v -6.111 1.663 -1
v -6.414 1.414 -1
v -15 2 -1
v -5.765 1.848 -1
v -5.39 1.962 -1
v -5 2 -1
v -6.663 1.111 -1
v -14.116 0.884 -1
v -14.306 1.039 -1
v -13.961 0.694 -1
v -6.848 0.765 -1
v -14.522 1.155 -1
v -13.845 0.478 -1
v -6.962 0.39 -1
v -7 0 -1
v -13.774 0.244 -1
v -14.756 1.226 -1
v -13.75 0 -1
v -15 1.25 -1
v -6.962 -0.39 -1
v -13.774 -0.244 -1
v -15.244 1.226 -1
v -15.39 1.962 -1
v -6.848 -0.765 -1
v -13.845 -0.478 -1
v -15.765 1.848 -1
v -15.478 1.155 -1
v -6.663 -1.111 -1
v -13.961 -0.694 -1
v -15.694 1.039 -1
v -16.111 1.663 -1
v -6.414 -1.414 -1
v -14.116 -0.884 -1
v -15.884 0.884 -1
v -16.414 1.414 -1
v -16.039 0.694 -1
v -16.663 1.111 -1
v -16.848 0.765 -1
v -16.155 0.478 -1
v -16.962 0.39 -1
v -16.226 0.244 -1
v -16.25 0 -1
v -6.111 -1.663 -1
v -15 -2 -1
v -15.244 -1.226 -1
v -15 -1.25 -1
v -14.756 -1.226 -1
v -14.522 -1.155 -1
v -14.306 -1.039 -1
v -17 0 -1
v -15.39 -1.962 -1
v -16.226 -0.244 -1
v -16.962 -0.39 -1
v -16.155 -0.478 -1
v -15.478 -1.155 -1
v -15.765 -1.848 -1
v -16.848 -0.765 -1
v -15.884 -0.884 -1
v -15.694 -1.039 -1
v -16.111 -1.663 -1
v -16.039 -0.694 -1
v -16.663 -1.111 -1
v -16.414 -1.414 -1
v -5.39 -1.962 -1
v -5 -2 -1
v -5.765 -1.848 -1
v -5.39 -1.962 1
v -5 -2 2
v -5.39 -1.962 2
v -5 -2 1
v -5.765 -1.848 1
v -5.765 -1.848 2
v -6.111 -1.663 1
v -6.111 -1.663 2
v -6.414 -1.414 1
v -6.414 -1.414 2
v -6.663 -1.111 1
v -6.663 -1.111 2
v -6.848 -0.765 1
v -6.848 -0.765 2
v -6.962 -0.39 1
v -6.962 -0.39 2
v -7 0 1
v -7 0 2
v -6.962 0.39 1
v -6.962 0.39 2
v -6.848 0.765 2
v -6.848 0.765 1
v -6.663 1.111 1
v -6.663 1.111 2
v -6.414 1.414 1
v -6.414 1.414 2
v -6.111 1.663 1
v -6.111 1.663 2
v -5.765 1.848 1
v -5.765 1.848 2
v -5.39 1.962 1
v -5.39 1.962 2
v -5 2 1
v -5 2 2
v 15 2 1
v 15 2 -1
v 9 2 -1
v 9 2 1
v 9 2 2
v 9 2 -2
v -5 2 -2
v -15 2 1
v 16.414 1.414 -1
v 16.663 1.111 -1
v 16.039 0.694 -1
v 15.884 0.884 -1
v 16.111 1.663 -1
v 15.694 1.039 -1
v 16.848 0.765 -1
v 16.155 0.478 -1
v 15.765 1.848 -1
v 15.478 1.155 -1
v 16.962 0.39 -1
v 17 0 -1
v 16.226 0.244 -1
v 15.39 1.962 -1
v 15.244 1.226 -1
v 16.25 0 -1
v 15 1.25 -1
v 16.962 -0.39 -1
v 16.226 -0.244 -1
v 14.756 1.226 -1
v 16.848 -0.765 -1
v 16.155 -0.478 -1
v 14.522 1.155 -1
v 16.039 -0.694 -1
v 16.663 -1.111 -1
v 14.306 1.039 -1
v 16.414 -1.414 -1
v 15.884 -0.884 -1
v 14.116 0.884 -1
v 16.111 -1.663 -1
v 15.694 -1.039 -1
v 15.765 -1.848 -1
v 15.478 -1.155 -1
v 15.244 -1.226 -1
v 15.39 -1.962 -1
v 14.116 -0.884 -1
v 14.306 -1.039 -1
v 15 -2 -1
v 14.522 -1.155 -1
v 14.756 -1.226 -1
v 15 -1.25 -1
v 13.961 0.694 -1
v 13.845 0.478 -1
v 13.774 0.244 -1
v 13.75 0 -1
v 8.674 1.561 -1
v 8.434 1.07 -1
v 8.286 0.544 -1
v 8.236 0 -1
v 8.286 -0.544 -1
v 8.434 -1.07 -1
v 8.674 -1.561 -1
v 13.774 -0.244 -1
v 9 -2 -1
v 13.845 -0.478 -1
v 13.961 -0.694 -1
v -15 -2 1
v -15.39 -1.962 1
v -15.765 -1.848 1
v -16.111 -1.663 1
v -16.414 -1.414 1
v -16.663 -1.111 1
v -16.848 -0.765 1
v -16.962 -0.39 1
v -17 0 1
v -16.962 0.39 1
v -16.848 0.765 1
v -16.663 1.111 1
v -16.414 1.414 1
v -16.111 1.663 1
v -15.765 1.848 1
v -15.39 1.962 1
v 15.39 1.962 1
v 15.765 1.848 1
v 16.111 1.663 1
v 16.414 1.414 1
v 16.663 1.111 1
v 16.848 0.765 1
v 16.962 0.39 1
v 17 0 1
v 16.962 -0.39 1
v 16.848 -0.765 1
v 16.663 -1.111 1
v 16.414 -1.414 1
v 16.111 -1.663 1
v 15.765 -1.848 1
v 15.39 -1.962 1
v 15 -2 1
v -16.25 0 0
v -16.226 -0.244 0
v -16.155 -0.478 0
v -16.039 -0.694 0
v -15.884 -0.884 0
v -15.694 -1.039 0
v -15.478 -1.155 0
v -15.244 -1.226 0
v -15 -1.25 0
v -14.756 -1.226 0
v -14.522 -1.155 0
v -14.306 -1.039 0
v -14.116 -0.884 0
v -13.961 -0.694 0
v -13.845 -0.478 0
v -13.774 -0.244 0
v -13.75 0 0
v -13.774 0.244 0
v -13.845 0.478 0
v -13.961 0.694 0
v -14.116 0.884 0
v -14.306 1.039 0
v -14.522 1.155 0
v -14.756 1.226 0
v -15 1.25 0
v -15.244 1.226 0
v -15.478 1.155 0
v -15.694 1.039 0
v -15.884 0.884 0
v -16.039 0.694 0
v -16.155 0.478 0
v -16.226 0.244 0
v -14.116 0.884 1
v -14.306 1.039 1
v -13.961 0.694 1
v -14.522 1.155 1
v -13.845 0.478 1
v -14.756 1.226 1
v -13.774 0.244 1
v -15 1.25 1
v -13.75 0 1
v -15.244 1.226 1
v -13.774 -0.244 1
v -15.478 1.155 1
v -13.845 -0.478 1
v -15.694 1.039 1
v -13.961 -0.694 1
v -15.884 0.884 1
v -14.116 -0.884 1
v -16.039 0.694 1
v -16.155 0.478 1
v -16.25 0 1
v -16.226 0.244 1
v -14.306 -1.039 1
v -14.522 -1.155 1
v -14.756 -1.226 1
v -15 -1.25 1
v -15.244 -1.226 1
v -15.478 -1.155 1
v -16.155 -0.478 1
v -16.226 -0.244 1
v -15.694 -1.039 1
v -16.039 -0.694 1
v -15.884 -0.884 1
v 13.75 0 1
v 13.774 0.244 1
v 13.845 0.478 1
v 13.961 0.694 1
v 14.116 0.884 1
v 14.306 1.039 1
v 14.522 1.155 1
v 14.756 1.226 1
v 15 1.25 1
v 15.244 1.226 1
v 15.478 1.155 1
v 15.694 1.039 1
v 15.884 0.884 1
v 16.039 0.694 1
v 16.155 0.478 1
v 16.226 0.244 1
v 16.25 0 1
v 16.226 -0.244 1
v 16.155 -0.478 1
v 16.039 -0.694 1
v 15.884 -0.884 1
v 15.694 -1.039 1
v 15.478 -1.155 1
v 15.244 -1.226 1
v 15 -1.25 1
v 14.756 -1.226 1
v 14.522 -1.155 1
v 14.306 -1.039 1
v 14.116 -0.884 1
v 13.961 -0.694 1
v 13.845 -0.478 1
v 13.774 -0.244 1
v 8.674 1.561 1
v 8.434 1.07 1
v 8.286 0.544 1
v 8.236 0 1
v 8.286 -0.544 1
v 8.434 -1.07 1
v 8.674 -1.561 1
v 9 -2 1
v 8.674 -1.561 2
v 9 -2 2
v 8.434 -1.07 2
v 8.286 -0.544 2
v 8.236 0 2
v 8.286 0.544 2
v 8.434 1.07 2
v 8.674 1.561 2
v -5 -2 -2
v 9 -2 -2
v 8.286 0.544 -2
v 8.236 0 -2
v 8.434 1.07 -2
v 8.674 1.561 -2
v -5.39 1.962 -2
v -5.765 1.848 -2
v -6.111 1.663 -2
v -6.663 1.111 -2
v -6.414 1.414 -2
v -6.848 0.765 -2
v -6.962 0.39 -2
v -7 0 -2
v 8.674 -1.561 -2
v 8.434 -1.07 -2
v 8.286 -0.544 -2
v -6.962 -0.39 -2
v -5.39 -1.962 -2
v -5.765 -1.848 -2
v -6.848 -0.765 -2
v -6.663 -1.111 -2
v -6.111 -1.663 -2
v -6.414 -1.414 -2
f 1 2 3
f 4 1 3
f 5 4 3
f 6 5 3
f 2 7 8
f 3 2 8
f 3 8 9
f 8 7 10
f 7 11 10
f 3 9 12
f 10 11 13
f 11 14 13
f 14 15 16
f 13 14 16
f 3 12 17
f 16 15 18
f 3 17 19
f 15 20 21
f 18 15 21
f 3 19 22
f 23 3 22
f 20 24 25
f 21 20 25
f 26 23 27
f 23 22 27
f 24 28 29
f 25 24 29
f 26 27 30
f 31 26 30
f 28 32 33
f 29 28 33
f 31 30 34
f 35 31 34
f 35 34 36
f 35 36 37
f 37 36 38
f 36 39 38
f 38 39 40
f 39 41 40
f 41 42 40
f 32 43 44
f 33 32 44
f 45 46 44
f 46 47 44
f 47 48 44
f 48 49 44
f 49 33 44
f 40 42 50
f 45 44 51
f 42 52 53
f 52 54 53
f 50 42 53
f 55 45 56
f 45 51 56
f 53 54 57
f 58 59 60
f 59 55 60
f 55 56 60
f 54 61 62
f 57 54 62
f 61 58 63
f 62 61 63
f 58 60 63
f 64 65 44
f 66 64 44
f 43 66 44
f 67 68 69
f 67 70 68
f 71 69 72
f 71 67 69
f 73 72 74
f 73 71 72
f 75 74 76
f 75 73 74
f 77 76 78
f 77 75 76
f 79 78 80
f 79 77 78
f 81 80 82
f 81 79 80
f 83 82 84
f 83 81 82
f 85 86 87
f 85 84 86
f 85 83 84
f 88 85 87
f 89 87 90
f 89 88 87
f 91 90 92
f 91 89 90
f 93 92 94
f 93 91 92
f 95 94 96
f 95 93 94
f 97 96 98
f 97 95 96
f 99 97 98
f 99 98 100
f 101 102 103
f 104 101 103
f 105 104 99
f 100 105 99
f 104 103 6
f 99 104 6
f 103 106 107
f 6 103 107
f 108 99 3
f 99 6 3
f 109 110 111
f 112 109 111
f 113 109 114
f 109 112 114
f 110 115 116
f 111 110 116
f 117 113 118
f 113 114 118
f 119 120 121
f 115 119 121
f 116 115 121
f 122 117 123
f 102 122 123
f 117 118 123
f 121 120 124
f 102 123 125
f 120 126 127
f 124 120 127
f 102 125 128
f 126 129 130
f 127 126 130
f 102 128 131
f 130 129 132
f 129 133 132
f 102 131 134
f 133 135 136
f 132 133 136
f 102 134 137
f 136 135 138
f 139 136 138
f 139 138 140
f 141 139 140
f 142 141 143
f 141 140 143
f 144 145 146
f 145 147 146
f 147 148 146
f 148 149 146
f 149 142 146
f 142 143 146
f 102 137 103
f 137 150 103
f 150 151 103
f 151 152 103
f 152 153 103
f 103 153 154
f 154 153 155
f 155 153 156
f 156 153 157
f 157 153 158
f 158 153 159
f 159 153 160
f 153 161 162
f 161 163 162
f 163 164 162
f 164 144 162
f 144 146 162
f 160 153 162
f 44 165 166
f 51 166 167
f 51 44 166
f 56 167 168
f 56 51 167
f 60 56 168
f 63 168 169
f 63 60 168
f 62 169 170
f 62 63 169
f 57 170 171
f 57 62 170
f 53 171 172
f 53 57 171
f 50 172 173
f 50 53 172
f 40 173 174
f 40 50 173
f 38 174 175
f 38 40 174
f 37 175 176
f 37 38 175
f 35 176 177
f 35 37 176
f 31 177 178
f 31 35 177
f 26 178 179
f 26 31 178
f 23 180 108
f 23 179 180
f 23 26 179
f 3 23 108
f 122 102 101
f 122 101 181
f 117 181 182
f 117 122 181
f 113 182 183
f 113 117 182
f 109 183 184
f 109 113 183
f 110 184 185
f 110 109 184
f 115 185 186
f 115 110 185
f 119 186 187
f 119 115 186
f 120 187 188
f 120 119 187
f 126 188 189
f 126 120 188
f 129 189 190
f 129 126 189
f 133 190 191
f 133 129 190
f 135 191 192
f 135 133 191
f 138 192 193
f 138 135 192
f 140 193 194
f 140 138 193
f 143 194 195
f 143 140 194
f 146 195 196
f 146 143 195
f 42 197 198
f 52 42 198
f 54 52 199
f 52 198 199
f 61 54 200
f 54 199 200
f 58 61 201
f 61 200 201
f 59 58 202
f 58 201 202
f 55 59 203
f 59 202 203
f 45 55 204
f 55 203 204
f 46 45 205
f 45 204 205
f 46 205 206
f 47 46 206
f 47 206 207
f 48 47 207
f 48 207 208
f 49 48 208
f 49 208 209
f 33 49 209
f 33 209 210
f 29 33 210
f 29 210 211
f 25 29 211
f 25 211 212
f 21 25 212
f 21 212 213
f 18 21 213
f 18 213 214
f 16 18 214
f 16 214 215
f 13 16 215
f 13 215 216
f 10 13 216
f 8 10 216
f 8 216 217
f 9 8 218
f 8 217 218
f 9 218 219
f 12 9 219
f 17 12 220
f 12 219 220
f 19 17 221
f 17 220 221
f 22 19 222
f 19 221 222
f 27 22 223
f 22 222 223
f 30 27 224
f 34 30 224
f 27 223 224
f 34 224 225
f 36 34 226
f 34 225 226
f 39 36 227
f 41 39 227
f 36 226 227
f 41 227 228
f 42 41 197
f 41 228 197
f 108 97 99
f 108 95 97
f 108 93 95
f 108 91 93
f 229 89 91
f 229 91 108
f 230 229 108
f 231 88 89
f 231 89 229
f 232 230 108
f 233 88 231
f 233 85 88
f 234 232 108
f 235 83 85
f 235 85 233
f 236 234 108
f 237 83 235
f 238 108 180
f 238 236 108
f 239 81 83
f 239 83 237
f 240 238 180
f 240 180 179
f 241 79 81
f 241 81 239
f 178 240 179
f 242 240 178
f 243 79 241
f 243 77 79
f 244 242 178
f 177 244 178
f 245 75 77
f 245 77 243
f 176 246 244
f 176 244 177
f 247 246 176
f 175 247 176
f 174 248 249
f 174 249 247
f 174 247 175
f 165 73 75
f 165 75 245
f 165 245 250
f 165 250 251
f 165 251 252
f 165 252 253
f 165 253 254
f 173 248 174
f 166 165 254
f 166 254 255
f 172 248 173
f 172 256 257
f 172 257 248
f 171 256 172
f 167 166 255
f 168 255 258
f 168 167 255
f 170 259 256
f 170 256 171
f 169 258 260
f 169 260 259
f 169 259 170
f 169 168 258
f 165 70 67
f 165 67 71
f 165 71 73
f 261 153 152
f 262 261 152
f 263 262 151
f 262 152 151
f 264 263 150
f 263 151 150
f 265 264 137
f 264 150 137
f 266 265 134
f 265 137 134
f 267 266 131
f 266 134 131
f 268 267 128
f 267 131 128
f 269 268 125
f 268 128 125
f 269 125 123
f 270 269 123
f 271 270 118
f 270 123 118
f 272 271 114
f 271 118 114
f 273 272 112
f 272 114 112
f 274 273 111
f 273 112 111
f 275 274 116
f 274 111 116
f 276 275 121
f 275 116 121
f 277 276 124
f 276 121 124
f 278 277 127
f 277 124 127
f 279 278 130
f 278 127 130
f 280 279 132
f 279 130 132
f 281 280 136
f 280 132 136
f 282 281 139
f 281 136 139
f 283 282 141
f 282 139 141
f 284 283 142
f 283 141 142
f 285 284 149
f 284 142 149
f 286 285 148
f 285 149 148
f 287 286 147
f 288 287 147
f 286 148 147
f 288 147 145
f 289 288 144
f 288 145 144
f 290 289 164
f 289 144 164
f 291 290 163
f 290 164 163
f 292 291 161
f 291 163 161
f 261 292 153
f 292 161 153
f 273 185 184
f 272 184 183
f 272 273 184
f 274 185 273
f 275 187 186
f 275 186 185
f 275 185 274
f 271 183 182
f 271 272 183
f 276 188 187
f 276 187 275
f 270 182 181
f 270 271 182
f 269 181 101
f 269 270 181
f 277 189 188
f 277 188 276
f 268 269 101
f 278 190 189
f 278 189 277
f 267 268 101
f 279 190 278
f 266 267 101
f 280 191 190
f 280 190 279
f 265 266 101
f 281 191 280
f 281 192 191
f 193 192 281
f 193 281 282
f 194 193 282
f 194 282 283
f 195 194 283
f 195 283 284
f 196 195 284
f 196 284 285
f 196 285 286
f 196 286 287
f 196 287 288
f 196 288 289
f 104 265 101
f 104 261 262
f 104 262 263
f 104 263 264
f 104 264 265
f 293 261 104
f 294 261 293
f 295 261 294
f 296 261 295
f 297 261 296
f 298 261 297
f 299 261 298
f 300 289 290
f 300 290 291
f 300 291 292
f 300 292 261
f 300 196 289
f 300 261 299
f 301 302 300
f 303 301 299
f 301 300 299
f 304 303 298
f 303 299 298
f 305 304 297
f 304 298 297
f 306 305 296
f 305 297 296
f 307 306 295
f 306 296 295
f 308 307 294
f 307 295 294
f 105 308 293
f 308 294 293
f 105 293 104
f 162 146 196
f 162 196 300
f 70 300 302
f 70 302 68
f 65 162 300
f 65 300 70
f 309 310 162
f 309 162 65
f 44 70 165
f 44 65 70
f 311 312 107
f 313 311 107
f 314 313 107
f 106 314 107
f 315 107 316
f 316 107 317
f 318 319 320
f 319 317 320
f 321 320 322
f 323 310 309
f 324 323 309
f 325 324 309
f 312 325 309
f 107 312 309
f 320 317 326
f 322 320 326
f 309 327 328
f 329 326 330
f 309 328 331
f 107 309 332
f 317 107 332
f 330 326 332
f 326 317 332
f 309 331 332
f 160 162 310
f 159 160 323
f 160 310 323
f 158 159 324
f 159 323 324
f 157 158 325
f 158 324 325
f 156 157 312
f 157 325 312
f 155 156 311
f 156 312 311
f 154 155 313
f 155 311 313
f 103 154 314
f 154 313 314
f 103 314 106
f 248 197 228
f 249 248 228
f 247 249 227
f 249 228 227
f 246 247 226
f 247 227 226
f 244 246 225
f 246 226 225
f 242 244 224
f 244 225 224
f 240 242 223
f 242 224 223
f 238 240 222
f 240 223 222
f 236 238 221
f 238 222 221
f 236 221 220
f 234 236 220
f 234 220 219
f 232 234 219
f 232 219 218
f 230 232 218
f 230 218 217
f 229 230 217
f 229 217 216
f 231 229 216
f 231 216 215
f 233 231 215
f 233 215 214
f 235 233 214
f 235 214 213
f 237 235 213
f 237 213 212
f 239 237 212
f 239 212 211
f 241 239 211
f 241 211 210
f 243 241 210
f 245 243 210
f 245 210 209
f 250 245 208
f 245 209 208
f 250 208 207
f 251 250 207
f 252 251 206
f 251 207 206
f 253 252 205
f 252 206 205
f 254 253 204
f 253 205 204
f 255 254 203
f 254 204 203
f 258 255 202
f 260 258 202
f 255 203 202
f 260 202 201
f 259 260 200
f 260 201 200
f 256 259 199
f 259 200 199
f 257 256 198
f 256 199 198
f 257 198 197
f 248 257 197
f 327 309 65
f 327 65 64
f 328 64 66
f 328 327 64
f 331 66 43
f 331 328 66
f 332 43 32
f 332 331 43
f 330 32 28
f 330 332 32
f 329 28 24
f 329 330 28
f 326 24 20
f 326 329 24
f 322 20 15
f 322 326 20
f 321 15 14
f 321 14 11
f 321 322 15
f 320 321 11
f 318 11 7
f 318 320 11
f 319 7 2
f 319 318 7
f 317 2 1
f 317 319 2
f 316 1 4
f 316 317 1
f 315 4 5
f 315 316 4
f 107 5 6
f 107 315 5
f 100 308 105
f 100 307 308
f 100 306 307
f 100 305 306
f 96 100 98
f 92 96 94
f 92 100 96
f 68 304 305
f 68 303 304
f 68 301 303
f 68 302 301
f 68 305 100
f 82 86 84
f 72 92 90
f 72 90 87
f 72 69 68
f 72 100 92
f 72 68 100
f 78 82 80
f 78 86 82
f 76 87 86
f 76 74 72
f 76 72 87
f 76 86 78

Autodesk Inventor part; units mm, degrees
ref_plane "YZ Plane" through (0, 0, 0) normal (1, 0, 0) x (0, 1, 0)
ref_plane "XZ Plane" through (0, 0, 0) normal (0, 1, 0) x (-1, 0, 0)
ref_plane "XY Plane" through (0, 0, 0) normal (0, 0, 1) x (1, 0, 0)
sketch "Sketch1" plane through (0, 0, 0) normal (0, 0, 1) x (1, 0, 0)
  line L0 (0, 0) -> (15, 0)
  line L1 (0, 0) -> (-15, 0)
  line L2 (0, 0) -> (5, 0)
  circle A0 centre (-15, 0) radius 1.25
  circle A1 centre (15, 0) radius 1.25
  circle A2 centre (-15, 0) radius 2
  circle A3 centre (15, 0) radius 2
  line L3 (-15, 2) -> (15, 2)
  line L4 (-15, -2) -> (15, -2)
  line L5 (-15, 2) -> (-9, 2)
  line L6 (-9, 2) -> (-9, -2)
  line L7 (-9, -2) -> (-15, -2)
  line L8 (-15, -2) -> (-15, 2)
  line L9 (15, 2) -> (12.5, 2)
  line L10 (15, -2) -> (15, 2)
  arc A4 (-9, -2) -> (-9, 2) centre (-11.2361, 0) ccw
  line L11 (5, 0) -> (1, 0)
  line L12 (5, 2) -> (5, 2)
  line L13 (5, 0) -> (9, 0)
  line L14 (-15, 2) -> (-14.5, 2)
  line L15 (-15, -2) -> (-14.5, -2)
  arc A5 (-14.5, -2) -> (-14.5, 2) centre (-14.5, 0) ccw
  line L16 (15, 0) -> (7, 0)
  line L17 (15, 2) -> (5, 2)
  line L18 (15, -2) -> (5, -2)
  arc A6 (5, -2) -> (5, 2) centre (5, 0) ccw
  point P0 (-9, 2)
  dimension "d1" = 15
  dimension "d2" = 15
  dimension "d4" = 2.5
  dimension "d6" = 2.5
  dimension "d7" = 4
  dimension "d8" = 4
  dimension "d10" = 6
  dimension "d16" = 4
  dimension "d17" = 3
  dimension "d24" = 0.5
  dimension "d25" = 0.5
  dimension "d26" = 2
  dimension "d37" = 8
  dimension "d38" = 10
  dimension "d45" = 10
extrude "Extrusion6" add sketch "Sketch1" along normal mid plane 2 contours A4 L6 L1 | L1 L6 A4 | L6 L4 A5 L1 | L1 A5 L3 L6 | A6 L3 A3 L0 | L0 A3 L4 A6 | A5 L4 A2 L1 | L1 A2 L3 A5 | A2 L8 A0 L1 | L1 A0 L8 A2 | A2 L8 A0 | L10 A1 A3 | A3 L0 A1 L10 | A3 L10 A1 L0
extrude "Extrusion7" add sketch "Sketch1" along normal mid plane 4 contours L1 A4 L3 A6 L0 | L0 A6 L4 A4 L1
move or copy body "Move Body1" bodies to move or copy 1 copy no rotation origin (0, 0, 0) rotation axis (0, 0, 1) rotation angle 180
properties part number "link7" material "Aluminum 6061"
